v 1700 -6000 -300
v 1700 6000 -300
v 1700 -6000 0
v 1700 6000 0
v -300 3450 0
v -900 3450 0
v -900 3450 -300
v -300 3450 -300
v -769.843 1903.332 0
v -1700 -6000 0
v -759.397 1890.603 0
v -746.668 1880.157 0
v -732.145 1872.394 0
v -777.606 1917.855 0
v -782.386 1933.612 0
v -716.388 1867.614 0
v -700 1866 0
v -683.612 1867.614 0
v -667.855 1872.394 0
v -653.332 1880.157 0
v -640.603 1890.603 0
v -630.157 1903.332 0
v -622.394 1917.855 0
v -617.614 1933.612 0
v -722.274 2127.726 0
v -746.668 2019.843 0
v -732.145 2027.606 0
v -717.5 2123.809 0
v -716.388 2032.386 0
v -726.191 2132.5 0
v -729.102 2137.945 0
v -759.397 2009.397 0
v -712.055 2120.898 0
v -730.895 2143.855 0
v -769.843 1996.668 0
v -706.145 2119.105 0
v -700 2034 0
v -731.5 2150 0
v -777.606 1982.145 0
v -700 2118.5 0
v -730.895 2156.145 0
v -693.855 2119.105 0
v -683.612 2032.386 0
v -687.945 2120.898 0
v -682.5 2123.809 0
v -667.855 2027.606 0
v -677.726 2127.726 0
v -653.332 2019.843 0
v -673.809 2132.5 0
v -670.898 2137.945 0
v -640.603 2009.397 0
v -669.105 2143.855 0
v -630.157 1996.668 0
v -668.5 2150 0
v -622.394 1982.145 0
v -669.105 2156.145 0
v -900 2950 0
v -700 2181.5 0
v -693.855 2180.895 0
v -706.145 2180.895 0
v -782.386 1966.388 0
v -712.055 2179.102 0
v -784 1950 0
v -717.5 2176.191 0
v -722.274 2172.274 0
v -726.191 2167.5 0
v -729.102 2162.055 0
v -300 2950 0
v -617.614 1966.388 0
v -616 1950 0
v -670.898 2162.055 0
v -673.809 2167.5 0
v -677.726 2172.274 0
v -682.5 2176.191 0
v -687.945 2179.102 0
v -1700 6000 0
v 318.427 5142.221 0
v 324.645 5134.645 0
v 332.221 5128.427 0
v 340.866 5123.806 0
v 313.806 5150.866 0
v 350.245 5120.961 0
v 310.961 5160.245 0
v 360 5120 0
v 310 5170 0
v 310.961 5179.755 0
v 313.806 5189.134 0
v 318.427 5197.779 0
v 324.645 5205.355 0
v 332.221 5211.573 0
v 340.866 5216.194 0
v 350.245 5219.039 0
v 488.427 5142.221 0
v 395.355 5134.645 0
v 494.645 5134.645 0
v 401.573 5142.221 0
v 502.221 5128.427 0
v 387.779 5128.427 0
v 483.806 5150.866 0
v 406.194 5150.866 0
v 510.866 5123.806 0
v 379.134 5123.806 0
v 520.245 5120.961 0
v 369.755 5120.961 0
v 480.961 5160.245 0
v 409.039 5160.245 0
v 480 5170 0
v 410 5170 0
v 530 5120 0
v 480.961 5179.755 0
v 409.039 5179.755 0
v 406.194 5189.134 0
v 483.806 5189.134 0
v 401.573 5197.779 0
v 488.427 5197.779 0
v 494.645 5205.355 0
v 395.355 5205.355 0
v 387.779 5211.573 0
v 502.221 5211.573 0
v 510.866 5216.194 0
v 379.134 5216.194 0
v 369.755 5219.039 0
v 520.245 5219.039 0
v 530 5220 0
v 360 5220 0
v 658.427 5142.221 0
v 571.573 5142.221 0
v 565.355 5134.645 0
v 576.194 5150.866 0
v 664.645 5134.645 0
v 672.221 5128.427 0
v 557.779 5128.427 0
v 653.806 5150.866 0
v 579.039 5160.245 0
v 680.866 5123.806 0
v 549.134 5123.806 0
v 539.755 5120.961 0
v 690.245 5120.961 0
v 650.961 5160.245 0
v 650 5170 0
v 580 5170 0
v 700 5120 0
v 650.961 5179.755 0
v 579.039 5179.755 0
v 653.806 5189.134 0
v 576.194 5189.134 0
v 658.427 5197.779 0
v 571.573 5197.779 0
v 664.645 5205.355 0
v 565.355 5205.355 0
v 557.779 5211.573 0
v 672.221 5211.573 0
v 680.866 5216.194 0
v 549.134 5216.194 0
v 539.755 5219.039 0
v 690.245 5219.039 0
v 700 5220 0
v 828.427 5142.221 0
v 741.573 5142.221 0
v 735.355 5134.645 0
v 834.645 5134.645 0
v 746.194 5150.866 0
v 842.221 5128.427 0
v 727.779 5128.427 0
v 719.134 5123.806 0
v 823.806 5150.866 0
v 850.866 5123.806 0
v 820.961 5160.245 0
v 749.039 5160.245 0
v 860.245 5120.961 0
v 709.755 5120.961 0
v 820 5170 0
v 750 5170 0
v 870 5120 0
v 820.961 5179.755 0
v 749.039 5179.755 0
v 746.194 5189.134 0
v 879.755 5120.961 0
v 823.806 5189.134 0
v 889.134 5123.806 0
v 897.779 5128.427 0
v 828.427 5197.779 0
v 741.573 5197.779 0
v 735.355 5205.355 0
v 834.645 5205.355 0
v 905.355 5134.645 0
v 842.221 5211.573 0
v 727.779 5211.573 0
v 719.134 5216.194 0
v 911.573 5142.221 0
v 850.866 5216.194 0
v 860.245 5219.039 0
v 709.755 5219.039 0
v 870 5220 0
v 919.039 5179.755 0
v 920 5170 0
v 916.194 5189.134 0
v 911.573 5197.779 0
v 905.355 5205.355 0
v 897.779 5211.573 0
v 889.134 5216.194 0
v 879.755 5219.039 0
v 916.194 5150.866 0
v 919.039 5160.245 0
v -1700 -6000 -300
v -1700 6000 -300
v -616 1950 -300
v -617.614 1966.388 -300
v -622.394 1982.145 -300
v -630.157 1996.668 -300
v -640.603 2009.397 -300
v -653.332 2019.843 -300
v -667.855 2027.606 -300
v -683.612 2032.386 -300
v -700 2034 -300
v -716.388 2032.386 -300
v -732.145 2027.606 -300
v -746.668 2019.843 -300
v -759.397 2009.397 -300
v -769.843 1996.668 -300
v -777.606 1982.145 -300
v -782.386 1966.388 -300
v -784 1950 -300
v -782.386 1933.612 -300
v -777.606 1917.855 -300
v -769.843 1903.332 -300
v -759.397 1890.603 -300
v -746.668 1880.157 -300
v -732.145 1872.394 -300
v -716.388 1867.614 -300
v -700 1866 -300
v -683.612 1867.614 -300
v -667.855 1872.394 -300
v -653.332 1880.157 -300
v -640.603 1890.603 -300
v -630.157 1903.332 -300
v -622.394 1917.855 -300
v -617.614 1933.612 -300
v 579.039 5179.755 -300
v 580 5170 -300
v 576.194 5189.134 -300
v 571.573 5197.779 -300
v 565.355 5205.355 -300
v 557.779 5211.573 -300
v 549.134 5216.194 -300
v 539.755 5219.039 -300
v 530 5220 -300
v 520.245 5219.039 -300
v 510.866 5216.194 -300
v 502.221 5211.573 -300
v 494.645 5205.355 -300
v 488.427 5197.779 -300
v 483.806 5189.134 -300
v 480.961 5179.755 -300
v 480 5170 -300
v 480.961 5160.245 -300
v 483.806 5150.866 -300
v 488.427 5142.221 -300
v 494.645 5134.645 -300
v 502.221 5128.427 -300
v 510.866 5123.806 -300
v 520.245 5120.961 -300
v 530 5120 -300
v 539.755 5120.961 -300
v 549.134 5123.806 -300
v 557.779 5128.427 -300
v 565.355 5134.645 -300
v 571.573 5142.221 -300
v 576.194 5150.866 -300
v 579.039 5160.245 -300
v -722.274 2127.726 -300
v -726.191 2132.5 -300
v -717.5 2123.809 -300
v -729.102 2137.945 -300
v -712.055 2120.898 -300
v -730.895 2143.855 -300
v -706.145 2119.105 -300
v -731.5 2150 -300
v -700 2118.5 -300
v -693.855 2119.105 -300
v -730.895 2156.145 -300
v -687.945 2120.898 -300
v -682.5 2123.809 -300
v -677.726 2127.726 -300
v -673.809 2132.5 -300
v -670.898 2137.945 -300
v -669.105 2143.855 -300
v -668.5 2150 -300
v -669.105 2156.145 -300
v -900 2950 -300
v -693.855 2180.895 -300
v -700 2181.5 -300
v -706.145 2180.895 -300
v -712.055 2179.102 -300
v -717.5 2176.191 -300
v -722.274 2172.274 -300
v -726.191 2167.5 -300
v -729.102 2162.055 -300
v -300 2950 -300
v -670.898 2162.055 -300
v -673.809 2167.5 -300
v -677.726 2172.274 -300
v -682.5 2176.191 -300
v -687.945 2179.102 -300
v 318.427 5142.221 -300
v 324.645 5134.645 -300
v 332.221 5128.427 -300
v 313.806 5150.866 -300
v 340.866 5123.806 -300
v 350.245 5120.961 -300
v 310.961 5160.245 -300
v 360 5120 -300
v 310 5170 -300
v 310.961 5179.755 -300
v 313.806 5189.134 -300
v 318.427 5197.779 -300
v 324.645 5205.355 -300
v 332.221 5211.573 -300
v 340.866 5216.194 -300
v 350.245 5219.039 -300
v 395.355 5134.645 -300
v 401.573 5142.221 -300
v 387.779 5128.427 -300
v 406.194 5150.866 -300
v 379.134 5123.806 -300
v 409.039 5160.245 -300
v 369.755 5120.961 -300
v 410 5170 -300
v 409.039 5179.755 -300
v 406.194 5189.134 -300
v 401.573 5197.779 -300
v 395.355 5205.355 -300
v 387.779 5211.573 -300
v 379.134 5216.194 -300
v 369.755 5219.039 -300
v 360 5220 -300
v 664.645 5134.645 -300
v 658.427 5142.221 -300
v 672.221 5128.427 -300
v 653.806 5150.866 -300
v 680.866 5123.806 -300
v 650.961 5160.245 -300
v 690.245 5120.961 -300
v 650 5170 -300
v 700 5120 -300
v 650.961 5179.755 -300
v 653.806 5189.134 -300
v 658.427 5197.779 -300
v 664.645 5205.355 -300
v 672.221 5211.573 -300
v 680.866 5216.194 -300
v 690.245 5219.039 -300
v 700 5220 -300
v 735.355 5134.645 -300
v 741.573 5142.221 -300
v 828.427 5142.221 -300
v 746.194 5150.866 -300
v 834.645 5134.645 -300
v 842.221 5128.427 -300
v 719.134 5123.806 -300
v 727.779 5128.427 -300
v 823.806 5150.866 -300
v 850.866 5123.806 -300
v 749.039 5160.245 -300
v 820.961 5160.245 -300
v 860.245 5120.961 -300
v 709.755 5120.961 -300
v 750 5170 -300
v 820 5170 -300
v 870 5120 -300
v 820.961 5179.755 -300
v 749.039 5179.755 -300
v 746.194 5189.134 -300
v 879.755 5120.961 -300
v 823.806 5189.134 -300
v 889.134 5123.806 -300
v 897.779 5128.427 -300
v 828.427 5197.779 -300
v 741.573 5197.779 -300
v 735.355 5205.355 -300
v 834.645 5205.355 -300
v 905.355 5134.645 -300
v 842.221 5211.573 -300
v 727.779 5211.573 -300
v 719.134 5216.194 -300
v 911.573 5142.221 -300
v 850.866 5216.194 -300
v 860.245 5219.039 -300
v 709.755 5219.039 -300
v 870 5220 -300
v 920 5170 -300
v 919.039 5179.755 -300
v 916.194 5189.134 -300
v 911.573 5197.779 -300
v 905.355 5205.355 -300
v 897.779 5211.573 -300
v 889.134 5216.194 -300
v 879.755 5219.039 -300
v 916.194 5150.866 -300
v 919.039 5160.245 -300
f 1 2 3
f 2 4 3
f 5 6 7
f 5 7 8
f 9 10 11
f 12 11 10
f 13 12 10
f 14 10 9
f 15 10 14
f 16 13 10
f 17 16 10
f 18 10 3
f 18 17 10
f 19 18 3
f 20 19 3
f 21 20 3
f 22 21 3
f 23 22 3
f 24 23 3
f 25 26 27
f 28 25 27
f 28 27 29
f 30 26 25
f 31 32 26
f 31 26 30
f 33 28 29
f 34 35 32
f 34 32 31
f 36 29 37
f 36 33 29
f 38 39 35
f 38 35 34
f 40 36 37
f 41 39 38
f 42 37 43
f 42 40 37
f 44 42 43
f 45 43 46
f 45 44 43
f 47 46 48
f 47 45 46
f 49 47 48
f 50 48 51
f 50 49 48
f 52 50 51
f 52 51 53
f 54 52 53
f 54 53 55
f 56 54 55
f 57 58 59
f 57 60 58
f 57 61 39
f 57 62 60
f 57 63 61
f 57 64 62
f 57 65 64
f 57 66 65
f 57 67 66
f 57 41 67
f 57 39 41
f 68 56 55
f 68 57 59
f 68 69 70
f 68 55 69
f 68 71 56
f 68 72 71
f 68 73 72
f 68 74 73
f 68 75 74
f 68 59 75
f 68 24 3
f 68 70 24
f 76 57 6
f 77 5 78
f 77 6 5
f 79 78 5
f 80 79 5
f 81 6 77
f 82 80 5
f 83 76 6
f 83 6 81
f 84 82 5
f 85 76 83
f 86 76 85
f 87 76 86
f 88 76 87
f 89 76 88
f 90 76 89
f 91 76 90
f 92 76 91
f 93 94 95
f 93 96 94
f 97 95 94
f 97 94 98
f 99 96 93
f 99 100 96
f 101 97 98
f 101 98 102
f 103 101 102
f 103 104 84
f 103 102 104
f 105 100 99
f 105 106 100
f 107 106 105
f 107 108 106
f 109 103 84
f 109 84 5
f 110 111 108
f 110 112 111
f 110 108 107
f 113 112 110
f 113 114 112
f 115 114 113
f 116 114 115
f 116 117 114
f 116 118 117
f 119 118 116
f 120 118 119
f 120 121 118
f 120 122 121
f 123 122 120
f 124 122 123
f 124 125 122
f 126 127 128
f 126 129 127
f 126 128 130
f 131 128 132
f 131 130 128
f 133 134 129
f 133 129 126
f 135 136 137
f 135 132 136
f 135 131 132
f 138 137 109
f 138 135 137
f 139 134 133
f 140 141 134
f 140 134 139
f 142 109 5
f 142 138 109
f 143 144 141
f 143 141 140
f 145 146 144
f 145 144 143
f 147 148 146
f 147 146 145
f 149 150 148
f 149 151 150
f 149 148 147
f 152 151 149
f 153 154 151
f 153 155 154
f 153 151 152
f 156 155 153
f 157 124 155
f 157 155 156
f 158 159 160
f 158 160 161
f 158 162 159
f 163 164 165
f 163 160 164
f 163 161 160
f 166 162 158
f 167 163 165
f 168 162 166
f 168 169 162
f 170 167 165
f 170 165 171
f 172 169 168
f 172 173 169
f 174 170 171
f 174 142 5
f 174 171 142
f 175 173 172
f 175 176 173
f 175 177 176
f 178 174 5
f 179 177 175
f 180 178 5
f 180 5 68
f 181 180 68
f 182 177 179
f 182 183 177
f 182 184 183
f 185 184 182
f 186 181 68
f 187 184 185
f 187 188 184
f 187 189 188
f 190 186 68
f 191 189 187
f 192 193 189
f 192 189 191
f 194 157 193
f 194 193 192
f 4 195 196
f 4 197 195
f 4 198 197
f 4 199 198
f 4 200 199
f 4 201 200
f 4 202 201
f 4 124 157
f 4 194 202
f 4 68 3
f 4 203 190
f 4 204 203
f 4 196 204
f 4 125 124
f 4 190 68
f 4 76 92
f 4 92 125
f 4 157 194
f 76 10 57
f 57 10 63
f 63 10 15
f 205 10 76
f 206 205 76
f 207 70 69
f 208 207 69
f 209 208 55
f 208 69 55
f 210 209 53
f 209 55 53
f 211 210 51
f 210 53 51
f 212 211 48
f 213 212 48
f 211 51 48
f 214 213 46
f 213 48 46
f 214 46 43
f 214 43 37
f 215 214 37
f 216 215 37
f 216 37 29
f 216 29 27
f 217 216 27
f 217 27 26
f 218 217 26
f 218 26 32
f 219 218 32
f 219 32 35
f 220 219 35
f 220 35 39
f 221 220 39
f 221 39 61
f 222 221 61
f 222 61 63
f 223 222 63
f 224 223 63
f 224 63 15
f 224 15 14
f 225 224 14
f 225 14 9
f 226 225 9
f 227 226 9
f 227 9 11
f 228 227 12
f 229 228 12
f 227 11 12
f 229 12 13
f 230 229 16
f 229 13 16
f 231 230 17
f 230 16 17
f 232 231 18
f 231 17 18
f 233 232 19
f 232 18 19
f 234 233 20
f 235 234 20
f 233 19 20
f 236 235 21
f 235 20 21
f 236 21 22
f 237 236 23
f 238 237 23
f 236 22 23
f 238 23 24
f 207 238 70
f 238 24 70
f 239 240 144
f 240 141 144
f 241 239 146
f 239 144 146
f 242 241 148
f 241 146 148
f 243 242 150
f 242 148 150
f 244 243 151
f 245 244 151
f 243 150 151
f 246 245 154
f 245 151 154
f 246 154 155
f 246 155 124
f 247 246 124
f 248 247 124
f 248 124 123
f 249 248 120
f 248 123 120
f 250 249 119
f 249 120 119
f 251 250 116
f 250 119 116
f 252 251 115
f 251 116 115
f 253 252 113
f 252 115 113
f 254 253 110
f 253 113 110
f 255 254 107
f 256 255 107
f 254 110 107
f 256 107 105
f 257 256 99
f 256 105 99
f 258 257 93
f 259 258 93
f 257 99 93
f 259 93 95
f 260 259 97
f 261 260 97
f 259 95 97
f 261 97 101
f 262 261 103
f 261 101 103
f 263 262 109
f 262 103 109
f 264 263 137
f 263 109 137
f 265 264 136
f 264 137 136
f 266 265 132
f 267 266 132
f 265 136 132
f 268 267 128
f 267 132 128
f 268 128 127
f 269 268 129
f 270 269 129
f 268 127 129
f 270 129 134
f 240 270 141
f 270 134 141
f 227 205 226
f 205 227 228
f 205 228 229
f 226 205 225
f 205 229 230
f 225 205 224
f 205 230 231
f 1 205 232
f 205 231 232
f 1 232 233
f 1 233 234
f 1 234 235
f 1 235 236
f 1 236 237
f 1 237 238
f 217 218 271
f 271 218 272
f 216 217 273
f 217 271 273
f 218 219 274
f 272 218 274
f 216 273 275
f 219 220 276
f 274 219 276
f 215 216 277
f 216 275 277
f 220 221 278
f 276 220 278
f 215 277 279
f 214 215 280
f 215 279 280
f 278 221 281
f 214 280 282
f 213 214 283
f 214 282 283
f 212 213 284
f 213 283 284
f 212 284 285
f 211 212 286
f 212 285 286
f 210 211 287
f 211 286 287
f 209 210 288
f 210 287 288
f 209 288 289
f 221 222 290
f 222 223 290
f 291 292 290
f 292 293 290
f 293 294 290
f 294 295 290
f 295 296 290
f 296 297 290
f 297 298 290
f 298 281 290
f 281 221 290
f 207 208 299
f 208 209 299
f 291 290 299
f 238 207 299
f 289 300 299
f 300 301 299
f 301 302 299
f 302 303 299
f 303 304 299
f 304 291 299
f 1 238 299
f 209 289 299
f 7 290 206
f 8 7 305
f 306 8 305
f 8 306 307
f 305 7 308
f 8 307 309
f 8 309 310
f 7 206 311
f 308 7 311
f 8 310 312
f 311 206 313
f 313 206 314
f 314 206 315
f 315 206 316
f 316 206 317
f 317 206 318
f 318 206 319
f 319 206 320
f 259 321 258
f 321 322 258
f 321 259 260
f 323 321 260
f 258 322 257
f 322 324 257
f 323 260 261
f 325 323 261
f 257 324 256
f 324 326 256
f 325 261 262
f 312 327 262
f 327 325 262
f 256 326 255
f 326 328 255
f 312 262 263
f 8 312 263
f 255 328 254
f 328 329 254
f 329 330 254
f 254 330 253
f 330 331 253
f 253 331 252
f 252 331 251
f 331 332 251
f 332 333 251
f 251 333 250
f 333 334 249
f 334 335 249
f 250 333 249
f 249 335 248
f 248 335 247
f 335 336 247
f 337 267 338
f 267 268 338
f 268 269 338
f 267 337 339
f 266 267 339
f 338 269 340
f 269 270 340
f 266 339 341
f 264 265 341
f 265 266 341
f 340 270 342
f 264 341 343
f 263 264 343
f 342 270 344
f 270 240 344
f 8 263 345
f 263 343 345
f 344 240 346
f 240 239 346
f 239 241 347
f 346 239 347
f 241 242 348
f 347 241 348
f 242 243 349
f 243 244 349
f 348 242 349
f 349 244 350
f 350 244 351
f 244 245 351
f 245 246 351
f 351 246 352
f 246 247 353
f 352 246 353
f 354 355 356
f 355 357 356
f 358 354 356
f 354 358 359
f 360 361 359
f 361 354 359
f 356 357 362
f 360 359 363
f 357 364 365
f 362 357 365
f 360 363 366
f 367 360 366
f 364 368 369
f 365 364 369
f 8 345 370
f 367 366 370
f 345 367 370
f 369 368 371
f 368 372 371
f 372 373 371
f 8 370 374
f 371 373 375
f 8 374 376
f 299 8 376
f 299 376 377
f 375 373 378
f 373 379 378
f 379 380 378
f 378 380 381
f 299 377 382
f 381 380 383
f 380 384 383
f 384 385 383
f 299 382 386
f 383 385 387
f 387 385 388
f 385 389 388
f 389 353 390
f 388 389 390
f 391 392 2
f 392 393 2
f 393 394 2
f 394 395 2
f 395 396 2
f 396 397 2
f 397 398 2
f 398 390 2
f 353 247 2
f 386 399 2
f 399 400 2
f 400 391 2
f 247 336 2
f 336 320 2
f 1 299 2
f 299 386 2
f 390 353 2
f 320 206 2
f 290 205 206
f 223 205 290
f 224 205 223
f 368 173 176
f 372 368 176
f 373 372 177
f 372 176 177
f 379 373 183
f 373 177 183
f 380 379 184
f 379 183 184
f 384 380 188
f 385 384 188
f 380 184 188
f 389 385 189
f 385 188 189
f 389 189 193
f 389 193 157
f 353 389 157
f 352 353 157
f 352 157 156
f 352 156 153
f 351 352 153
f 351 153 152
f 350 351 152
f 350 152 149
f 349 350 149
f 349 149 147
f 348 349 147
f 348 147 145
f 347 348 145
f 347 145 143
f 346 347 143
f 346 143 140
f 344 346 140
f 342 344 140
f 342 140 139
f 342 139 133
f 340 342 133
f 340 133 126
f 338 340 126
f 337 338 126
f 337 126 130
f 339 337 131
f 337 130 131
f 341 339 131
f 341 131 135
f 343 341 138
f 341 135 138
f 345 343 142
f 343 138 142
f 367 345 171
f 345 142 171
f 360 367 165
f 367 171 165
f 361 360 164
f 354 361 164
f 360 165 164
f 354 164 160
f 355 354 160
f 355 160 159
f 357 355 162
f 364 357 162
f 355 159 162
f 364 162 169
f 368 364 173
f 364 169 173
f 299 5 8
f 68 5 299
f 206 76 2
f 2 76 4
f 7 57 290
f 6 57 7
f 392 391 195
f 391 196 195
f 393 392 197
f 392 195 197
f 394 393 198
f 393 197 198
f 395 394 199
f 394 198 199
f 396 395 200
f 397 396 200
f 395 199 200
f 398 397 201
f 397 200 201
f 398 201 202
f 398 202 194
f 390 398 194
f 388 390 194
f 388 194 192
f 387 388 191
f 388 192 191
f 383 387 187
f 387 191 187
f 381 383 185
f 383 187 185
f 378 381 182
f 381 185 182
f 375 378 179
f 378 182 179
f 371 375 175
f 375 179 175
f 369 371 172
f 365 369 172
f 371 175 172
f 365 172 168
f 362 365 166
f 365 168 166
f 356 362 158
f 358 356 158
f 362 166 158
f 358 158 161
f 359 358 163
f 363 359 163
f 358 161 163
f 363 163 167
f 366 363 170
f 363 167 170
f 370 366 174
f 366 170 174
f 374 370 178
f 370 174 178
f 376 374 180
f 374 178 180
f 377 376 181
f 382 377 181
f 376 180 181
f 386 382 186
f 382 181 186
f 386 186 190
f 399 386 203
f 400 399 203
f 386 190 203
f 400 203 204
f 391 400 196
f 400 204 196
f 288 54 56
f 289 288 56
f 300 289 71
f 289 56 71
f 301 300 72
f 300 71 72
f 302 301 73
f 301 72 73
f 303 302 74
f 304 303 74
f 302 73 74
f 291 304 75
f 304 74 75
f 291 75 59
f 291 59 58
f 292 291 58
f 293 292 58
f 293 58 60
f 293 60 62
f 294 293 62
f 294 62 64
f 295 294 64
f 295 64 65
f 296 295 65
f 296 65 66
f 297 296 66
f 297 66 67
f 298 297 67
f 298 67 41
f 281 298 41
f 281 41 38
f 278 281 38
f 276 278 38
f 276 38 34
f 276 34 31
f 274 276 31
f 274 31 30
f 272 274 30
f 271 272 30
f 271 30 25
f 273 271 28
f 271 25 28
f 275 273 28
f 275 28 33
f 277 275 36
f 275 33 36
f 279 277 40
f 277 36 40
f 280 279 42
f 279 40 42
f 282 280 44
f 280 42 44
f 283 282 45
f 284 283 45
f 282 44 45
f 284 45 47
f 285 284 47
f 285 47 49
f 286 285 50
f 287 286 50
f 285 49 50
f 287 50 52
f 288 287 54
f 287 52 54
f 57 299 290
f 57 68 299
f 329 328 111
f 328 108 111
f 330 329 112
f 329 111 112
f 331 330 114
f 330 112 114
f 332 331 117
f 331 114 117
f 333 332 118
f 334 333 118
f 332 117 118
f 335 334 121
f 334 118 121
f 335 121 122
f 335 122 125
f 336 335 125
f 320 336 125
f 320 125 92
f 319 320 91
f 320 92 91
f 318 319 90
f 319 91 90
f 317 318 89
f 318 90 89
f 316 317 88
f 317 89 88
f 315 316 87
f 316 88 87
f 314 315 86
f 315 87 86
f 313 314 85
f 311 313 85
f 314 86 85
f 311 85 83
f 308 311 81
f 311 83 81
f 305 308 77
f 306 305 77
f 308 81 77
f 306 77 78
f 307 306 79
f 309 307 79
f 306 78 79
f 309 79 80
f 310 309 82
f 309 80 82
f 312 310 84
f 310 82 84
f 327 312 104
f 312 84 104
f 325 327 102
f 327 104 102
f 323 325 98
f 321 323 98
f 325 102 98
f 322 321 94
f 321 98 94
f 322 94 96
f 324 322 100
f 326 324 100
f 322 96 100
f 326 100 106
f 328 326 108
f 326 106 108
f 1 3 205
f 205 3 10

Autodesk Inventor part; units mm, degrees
ref_plane "YZ Plane" through (0, 0, 0) normal (1, 0, 0) x (0, 1, 0)
ref_plane "XZ Plane" through (0, 0, 0) normal (0, 1, 0) x (-1, 0, 0)
ref_plane "XY Plane" through (0, 0, 0) normal (0, 0, 1) x (1, 0, 0)
sketch "Sketch1" plane through (0, 0, 0) normal (0, 0, 1) x (1, 0, 0)
  line L0 (-1700, 6000) -> (1700, 6000)
  line L1 (1700, 6000) -> (1700, -6000)
  line L2 (1700, -6000) -> (-1700, -6000)
  line L3 (-1700, -6000) -> (-1700, 6000)
  line L4 (-1700, 6000) -> (1700, -6000) construction
  line L5 (1700, 6000) -> (-1700, -6000) construction
  line L6 (-900, 3450) -> (-300, 3450)
  line L7 (-300, 3450) -> (-300, 2950)
  line L8 (-300, 2950) -> (-900, 2950)
  line L9 (-900, 2950) -> (-900, 3450)
  line L10 (-900, 3450) -> (-300, 2950) construction
  line L11 (-300, 3450) -> (-900, 2950) construction
  circle A0 centre (-700, 1950) radius 84
  circle A1 centre (-700, 2150) radius 31.5
  circle A2 centre (870, 5170) radius 50
  circle A3 centre (700, 5170) radius 50
  circle A4 centre (530, 5170) radius 50
  circle A5 centre (360, 5170) radius 50
  line L12 (360, 5170) -> (870, 5170) construction
  line L13 (1700, 6000) -> (920, 6000) construction
  line L14 (920, 6000) -> (920, 5220) construction
  line L15 (920, 5220) -> (1700, 5220) construction
  line L16 (1700, 5220) -> (1700, 6000) construction
  point P0 (0, 0)
  point P1 (-600, 3200)
  dimension "d0" = 3400
  dimension "d1" = 12000
  dimension "d2" = 600
  dimension "d3" = 500
  dimension "d4" = 168
  dimension "d5" = 63
  dimension "d6" = 1000
  dimension "d7" = 800
  dimension "d10" = 2550
  dimension "d11" = 3850
  dimension "d12" = 200
  dimension "d13" = 100
  dimension "d14" = 170
  dimension "d15" = 170
  dimension "d16" = 170
  dimension "d17" = 780
  dimension "d18" = 780
extrude "Extrusion1" add sketch "Sketch1" against normal blind 300
equation "\"d15\" = d14"
equation "\"d16\" = d14"
properties part number "GnG foundation"
